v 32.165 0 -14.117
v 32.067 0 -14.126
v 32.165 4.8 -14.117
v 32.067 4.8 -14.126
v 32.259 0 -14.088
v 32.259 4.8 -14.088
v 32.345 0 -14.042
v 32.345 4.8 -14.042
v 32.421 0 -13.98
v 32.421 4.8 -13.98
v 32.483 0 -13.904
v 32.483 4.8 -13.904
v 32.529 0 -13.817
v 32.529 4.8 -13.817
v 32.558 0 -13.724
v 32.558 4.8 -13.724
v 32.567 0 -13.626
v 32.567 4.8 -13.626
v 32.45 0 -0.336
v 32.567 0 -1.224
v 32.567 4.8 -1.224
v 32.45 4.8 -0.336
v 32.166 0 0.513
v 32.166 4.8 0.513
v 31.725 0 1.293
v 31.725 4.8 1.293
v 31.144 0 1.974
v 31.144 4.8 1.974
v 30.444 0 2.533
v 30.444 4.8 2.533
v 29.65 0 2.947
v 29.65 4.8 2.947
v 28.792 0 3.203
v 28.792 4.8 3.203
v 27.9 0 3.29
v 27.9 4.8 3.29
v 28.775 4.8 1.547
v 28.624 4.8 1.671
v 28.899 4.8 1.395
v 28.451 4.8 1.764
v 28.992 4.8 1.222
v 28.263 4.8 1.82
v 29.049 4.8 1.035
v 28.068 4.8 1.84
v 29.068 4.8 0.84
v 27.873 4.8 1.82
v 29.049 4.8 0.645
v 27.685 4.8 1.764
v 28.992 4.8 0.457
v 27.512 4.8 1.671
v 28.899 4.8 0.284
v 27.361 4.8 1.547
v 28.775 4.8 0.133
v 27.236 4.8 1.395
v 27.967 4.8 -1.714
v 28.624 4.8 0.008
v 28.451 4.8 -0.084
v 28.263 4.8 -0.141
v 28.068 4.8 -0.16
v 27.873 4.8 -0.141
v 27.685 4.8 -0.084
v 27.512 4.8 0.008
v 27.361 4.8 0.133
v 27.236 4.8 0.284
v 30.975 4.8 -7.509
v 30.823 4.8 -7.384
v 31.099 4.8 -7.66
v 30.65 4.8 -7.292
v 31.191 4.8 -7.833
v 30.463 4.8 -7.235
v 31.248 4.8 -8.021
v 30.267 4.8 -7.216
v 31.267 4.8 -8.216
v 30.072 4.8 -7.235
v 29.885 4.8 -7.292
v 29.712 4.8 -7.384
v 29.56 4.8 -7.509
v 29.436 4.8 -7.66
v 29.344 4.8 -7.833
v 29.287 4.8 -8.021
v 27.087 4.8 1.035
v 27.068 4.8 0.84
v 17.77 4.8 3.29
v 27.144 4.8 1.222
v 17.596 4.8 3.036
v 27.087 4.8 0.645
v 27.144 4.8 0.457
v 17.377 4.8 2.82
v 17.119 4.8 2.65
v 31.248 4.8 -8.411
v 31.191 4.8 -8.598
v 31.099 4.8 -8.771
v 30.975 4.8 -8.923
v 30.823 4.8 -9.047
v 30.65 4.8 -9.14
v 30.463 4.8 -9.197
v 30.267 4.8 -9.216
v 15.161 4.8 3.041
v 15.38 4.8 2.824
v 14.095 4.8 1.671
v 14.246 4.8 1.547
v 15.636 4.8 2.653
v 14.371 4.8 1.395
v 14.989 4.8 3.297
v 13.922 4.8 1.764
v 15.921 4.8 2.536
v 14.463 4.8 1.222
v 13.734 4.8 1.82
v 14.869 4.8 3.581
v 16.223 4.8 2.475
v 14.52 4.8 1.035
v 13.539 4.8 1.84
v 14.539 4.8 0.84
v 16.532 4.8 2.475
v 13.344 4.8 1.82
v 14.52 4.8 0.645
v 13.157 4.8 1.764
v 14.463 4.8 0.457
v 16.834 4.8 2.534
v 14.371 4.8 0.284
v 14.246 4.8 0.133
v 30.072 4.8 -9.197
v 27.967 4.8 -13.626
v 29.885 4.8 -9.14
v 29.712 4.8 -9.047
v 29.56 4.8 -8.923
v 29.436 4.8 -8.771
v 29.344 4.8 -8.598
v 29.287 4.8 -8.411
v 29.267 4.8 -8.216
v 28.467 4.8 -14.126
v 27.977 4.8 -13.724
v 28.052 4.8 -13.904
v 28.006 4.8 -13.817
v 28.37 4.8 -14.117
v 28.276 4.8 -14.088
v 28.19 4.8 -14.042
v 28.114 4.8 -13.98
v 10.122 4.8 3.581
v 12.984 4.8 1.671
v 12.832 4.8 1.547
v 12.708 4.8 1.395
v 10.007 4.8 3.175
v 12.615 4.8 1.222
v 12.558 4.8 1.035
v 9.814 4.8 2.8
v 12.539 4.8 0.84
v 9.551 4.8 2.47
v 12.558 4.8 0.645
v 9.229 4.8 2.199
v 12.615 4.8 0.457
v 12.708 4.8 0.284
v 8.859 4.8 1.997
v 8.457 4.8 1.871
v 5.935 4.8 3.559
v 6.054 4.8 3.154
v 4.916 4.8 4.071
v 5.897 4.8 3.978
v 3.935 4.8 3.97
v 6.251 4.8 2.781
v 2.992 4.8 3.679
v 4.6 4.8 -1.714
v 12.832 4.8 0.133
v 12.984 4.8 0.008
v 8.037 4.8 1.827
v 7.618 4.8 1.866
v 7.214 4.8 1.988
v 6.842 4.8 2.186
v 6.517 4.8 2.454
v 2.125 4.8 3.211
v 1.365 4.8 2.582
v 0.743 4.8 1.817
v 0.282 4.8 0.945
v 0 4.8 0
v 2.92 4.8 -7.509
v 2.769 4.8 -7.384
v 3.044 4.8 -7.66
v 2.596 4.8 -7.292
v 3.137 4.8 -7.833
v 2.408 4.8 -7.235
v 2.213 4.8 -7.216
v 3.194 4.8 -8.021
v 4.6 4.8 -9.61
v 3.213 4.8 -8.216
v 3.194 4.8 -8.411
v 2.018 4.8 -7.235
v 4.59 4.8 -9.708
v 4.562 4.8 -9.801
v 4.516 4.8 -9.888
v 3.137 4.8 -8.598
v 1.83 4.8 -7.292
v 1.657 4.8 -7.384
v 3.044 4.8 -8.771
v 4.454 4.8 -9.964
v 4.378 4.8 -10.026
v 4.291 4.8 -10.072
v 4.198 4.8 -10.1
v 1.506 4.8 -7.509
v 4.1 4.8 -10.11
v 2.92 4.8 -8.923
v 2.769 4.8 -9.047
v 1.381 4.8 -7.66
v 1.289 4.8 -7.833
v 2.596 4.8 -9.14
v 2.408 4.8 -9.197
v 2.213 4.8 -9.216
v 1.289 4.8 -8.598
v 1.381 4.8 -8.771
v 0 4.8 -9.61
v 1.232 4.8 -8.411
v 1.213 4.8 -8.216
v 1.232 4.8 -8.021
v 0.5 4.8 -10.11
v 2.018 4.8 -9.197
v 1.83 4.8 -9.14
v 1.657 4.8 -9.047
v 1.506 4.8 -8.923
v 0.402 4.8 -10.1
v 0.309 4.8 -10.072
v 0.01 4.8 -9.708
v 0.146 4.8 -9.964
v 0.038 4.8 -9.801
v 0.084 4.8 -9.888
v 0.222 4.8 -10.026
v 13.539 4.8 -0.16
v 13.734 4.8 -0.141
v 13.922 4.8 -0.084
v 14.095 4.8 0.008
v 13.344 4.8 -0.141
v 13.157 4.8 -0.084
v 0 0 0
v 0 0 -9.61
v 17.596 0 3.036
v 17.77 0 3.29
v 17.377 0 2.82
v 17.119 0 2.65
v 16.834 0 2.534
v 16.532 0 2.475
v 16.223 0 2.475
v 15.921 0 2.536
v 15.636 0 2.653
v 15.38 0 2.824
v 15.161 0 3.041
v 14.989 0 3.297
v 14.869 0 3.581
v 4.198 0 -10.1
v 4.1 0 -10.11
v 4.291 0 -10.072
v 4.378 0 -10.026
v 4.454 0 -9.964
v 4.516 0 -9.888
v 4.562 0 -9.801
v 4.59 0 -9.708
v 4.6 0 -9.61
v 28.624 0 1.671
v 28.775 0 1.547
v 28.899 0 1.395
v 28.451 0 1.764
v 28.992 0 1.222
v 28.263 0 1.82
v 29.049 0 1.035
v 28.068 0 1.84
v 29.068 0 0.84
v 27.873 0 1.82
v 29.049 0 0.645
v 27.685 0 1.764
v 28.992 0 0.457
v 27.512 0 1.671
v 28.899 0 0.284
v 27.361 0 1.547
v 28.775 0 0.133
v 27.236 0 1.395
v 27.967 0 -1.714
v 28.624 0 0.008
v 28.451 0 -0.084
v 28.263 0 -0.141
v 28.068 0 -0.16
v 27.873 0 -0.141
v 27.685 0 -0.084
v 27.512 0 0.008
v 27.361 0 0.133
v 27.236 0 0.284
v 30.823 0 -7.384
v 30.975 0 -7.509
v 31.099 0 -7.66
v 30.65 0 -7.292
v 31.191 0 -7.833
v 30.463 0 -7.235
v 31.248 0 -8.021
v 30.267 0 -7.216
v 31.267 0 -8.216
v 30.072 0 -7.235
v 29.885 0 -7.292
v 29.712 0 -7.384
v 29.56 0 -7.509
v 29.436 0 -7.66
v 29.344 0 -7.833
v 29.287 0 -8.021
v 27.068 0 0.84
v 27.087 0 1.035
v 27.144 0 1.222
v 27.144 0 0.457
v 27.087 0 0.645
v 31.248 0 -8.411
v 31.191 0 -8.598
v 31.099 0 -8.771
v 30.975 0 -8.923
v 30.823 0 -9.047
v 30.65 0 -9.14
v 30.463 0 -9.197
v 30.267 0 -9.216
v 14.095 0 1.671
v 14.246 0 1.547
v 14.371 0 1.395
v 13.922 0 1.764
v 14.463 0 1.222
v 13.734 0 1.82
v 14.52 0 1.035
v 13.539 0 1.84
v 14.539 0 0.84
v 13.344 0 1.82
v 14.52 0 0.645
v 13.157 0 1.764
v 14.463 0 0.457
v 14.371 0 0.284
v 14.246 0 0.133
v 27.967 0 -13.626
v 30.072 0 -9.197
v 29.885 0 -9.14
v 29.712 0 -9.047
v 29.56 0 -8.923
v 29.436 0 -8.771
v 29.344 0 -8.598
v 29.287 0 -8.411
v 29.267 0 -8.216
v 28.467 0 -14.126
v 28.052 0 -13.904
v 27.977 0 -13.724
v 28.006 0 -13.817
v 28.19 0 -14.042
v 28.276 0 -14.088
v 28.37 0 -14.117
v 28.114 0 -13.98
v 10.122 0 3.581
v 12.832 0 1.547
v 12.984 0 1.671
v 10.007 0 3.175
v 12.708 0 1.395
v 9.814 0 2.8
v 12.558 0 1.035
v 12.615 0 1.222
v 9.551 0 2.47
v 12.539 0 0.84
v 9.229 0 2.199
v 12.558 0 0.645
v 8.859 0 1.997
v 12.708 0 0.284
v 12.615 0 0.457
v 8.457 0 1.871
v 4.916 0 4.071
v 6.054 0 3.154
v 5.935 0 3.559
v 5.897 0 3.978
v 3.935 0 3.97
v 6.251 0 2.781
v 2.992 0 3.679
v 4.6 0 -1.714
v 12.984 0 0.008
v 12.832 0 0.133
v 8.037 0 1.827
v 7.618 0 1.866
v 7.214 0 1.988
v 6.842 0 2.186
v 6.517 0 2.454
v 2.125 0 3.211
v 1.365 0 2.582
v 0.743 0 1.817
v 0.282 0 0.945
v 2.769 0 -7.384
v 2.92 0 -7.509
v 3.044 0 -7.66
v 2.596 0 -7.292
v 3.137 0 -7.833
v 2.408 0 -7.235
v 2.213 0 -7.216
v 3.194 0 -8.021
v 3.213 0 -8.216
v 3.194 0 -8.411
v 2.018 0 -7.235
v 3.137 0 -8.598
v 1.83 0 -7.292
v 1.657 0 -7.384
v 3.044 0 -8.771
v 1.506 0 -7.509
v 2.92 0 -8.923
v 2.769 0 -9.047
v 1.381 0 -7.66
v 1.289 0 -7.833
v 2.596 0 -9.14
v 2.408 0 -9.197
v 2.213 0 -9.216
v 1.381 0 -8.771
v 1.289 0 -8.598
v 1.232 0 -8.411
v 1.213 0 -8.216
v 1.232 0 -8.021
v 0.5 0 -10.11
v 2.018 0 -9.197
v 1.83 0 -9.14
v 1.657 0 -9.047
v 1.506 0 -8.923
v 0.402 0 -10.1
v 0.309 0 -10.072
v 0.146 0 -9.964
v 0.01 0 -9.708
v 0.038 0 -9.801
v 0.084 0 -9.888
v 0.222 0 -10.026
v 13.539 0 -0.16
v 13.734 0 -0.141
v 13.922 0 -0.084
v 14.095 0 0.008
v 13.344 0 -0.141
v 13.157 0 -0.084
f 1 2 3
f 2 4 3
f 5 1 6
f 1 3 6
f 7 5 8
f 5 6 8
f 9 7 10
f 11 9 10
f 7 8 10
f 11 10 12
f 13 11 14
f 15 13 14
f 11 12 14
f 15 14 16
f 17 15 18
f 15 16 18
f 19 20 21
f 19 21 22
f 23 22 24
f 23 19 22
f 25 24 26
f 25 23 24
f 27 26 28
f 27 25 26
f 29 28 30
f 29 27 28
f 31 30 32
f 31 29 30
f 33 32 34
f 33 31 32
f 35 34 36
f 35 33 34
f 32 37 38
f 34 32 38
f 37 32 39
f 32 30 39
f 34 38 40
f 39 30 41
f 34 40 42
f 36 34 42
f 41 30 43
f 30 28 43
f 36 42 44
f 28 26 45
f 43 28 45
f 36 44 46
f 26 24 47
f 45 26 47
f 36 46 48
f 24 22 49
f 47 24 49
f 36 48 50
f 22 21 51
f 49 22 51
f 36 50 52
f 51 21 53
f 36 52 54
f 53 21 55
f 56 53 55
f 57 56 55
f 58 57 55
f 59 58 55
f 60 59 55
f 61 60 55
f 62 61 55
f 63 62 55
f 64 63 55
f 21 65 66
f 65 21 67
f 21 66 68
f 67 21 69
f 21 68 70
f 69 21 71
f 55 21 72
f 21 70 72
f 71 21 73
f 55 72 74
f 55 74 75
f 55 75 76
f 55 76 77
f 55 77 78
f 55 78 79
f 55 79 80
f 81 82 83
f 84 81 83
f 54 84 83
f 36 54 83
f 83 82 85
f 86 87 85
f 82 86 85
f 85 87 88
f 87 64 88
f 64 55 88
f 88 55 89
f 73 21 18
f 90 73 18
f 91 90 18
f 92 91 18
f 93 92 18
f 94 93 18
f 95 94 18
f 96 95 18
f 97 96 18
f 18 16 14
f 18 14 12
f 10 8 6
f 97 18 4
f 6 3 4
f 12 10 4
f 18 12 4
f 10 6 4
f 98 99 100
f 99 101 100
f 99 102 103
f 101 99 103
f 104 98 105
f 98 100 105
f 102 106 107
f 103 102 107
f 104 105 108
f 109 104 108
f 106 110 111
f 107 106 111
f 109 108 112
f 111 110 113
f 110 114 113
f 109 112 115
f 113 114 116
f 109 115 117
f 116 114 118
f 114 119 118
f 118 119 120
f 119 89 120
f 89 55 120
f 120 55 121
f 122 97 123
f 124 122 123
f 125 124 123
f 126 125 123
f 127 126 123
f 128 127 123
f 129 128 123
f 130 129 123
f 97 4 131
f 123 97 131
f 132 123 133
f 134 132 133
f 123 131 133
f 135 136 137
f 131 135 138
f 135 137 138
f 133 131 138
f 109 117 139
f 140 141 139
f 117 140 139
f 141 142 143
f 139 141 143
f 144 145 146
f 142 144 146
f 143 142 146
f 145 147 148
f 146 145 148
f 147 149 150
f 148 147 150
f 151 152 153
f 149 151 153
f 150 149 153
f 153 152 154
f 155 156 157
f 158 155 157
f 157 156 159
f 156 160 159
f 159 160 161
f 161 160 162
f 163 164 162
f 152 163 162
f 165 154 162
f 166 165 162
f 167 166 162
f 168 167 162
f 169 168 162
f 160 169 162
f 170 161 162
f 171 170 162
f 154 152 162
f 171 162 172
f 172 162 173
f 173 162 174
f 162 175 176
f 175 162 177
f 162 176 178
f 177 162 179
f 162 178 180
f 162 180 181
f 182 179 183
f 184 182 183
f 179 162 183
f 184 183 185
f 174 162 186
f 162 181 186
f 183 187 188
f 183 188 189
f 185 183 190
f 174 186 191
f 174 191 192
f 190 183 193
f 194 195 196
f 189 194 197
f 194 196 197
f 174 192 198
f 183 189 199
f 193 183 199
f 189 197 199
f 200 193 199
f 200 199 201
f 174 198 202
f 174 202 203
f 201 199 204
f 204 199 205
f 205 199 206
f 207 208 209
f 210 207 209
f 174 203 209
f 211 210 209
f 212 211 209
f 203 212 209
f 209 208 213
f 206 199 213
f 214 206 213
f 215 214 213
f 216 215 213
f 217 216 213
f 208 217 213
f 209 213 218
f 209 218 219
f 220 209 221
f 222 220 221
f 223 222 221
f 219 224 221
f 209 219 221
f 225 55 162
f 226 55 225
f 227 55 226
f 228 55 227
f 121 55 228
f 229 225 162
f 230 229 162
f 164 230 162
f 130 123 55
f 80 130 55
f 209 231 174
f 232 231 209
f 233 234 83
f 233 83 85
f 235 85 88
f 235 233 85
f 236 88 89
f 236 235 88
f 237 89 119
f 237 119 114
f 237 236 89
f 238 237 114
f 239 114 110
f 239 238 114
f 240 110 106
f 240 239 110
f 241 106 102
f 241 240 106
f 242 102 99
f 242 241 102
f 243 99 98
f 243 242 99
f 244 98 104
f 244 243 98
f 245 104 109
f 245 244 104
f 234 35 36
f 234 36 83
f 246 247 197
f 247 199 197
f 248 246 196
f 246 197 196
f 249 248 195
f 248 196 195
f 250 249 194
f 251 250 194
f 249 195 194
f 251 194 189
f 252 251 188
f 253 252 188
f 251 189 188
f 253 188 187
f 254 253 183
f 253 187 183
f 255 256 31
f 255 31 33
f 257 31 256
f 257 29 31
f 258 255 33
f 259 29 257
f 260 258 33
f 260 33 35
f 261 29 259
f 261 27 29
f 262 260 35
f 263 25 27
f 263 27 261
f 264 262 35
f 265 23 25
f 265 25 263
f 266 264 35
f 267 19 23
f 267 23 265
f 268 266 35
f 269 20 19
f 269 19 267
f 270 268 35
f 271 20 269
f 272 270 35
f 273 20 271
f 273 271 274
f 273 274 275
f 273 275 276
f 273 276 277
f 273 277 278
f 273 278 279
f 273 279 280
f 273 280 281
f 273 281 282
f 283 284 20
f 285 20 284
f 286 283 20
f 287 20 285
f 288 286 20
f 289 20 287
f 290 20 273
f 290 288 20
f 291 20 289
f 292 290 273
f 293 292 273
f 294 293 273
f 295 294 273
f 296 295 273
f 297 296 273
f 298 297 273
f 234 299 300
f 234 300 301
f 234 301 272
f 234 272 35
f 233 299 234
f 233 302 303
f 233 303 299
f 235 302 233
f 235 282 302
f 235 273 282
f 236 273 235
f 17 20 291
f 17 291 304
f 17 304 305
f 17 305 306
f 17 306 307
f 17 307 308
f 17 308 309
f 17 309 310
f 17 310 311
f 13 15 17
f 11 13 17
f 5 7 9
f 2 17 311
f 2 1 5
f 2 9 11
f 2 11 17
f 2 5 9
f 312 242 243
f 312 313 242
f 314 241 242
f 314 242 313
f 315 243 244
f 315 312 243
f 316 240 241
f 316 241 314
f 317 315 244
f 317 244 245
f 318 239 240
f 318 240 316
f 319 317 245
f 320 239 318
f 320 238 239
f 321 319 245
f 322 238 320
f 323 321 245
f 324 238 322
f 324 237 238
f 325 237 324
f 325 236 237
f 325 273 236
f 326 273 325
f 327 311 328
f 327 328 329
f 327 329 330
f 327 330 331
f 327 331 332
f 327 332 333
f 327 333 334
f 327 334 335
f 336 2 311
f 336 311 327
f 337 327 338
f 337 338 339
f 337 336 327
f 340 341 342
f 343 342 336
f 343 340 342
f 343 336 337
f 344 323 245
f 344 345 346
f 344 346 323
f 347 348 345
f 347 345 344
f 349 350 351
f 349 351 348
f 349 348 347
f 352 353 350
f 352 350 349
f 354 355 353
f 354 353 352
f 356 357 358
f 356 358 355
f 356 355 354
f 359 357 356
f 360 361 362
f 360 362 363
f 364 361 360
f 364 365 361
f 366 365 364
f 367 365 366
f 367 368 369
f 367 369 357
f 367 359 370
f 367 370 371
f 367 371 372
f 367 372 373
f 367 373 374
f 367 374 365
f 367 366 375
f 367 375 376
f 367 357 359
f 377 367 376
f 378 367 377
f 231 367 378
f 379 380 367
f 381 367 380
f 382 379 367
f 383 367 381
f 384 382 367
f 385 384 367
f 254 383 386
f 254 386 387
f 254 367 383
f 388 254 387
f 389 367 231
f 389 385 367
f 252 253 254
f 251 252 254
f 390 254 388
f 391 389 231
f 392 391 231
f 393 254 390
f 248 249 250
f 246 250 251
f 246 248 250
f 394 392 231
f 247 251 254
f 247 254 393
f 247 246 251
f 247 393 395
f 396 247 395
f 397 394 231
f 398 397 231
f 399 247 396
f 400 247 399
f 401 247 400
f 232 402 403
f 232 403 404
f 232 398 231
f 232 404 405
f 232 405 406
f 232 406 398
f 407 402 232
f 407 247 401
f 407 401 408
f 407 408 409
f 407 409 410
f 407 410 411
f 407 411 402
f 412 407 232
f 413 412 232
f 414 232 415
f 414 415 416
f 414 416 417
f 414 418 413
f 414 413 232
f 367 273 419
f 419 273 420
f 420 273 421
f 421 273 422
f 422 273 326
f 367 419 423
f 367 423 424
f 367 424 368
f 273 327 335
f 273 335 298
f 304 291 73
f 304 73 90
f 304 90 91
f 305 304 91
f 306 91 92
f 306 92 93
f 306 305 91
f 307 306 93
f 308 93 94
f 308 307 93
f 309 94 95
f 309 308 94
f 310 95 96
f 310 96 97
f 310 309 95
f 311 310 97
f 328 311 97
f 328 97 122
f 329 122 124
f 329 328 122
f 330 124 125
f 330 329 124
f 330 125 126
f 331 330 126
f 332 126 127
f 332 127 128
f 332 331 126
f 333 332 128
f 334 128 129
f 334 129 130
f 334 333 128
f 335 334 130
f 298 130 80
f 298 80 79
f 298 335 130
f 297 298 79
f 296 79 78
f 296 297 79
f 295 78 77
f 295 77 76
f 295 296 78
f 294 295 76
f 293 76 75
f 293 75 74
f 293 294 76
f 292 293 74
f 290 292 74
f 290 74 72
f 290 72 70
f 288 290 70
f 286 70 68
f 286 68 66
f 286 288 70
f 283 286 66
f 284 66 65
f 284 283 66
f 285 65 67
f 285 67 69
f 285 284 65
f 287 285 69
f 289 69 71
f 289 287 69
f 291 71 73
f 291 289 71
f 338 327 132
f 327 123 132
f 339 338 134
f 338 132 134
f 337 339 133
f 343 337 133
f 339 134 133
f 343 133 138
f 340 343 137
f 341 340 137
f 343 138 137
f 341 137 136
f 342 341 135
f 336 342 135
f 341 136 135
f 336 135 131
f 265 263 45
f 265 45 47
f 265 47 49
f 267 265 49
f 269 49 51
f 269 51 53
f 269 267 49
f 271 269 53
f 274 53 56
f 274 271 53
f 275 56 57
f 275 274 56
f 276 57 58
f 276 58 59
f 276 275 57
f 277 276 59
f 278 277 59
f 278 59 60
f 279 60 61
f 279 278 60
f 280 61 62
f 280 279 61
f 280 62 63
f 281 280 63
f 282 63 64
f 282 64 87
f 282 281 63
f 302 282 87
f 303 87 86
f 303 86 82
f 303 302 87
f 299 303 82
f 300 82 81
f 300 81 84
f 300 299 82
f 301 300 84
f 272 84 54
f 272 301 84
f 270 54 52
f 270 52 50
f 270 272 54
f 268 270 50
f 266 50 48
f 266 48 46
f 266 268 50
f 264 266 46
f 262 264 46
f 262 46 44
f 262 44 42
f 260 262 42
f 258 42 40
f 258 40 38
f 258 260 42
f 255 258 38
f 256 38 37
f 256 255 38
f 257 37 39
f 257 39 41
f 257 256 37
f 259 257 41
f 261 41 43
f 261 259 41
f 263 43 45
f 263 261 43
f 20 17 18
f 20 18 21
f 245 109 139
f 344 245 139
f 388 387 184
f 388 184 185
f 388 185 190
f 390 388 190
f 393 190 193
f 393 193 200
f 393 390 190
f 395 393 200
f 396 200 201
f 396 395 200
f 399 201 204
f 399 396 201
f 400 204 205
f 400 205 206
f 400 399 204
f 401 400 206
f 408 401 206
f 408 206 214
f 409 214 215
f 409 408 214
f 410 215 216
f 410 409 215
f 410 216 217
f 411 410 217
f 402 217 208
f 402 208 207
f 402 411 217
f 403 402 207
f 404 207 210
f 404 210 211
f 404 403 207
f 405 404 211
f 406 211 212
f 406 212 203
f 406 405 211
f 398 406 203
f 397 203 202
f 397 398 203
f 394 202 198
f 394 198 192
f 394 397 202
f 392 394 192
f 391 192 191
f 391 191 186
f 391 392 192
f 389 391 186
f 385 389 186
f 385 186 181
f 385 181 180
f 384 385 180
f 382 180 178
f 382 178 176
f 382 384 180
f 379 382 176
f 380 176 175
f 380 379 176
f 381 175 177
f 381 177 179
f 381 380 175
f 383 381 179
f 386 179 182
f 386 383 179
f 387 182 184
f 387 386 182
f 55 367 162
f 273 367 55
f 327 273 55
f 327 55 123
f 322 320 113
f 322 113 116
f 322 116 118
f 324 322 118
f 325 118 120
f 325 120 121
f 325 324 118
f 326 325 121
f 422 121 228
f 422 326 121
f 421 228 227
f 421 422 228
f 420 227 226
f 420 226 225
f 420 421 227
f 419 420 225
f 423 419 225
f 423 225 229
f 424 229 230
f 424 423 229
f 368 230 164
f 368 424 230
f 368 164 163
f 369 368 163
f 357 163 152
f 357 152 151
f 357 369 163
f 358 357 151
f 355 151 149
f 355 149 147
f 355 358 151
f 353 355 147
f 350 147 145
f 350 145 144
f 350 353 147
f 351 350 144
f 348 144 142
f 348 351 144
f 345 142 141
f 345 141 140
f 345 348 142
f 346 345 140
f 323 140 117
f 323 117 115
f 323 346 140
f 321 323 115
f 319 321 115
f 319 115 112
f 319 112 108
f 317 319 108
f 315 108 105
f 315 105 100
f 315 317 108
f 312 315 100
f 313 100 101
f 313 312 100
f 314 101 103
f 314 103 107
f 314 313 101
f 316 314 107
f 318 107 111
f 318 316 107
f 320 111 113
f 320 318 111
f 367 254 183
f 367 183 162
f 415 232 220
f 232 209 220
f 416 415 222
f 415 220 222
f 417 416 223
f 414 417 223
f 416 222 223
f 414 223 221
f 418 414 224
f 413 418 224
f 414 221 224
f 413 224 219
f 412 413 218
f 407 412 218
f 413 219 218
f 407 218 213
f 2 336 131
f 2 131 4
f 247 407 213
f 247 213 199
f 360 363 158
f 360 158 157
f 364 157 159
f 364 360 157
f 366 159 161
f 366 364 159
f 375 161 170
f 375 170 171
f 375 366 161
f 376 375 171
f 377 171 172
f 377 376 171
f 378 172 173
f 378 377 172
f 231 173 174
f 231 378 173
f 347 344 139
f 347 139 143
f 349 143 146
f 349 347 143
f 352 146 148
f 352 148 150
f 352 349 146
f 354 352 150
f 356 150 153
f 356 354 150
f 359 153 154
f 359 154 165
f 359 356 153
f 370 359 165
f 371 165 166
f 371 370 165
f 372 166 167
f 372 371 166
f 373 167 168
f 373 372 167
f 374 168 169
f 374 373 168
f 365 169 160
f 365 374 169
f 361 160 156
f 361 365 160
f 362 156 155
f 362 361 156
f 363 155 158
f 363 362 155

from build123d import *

# Parameters (mm, degrees)
SKETCH1_R           = 1
BOSS_EXTRUDE1_DEPTH = 4.8
FILLET1_R           = 0.5


with BuildPart() as part:
    # Sketch1 → Boss-Extrude1 (new body)
    with BuildSketch(Plane(origin=(0, 0, 0), x_dir=(1, 0, 0), z_dir=(0, 1, 0))):
        with BuildLine():
            Line((0, 0), (0, 10.109966322))
            Line((0, 10.109966322), (4.6, 10.109966322))
            Line((4.6, 10.109966322), (4.6, 1.714229872))
            Line((4.6, 1.714229872), (27.967443814, 1.714229872))
            Line((27.967443814, 1.714229872), (27.967443814, 14.126132931))
            Line((27.967443814, 14.126132931), (32.567443814, 14.126132931))
            Line((32.567443814, 14.126132931), (32.567443814, 1.22414249))
            ThreePointArc((32.567443814, 1.22414249), (31.144234193, -1.974320184), (27.900175322, -3.290287941))
            Line((27.900175322, -3.290287941), (17.770133396, -3.290287941))
            ThreePointArc((17.770133396, -3.290287941), (16.223398412, -2.475294407), (14.868870839, -3.580671549))
            Line((14.868870839, -3.580671549), (10.12183502, -3.580671549))
            ThreePointArc((10.12183502, -3.580671549), (7.826617972, -1.836209825), (5.897335796, -3.978413896))
            ThreePointArc((5.897335796, -3.978413896), (2.124711402, -3.210585182), (0, 0))
        make_face()
        with Locations((28.067931627, -0.839685826)):
            Circle(SKETCH1_R, mode=Mode.SUBTRACT)
        with Locations((30.267443814, 8.215801601)):
            Circle(SKETCH1_R, mode=Mode.SUBTRACT)
        with Locations((2.212966765, 8.215801601)):
            Circle(SKETCH1_R, mode=Mode.SUBTRACT)
        with Locations((13.539270752, -0.839685826)):
            Circle(SKETCH1_R, mode=Mode.SUBTRACT)
    extrude(amount=BOSS_EXTRUDE1_DEPTH)

    # Fillet1
    fillet1_edges = [part.edges().sort_by_distance(p)[0] for p in [
        (27.967443814, 2.4, -14.126132931),
        (32.567443814, 2.4, -14.126132931),
        (0, 2.4, -10.109966322),
        (4.6, 2.4, -10.109966322),
    ]]
    fillet(fillet1_edges, radius=FILLET1_R)


solid = part.part
